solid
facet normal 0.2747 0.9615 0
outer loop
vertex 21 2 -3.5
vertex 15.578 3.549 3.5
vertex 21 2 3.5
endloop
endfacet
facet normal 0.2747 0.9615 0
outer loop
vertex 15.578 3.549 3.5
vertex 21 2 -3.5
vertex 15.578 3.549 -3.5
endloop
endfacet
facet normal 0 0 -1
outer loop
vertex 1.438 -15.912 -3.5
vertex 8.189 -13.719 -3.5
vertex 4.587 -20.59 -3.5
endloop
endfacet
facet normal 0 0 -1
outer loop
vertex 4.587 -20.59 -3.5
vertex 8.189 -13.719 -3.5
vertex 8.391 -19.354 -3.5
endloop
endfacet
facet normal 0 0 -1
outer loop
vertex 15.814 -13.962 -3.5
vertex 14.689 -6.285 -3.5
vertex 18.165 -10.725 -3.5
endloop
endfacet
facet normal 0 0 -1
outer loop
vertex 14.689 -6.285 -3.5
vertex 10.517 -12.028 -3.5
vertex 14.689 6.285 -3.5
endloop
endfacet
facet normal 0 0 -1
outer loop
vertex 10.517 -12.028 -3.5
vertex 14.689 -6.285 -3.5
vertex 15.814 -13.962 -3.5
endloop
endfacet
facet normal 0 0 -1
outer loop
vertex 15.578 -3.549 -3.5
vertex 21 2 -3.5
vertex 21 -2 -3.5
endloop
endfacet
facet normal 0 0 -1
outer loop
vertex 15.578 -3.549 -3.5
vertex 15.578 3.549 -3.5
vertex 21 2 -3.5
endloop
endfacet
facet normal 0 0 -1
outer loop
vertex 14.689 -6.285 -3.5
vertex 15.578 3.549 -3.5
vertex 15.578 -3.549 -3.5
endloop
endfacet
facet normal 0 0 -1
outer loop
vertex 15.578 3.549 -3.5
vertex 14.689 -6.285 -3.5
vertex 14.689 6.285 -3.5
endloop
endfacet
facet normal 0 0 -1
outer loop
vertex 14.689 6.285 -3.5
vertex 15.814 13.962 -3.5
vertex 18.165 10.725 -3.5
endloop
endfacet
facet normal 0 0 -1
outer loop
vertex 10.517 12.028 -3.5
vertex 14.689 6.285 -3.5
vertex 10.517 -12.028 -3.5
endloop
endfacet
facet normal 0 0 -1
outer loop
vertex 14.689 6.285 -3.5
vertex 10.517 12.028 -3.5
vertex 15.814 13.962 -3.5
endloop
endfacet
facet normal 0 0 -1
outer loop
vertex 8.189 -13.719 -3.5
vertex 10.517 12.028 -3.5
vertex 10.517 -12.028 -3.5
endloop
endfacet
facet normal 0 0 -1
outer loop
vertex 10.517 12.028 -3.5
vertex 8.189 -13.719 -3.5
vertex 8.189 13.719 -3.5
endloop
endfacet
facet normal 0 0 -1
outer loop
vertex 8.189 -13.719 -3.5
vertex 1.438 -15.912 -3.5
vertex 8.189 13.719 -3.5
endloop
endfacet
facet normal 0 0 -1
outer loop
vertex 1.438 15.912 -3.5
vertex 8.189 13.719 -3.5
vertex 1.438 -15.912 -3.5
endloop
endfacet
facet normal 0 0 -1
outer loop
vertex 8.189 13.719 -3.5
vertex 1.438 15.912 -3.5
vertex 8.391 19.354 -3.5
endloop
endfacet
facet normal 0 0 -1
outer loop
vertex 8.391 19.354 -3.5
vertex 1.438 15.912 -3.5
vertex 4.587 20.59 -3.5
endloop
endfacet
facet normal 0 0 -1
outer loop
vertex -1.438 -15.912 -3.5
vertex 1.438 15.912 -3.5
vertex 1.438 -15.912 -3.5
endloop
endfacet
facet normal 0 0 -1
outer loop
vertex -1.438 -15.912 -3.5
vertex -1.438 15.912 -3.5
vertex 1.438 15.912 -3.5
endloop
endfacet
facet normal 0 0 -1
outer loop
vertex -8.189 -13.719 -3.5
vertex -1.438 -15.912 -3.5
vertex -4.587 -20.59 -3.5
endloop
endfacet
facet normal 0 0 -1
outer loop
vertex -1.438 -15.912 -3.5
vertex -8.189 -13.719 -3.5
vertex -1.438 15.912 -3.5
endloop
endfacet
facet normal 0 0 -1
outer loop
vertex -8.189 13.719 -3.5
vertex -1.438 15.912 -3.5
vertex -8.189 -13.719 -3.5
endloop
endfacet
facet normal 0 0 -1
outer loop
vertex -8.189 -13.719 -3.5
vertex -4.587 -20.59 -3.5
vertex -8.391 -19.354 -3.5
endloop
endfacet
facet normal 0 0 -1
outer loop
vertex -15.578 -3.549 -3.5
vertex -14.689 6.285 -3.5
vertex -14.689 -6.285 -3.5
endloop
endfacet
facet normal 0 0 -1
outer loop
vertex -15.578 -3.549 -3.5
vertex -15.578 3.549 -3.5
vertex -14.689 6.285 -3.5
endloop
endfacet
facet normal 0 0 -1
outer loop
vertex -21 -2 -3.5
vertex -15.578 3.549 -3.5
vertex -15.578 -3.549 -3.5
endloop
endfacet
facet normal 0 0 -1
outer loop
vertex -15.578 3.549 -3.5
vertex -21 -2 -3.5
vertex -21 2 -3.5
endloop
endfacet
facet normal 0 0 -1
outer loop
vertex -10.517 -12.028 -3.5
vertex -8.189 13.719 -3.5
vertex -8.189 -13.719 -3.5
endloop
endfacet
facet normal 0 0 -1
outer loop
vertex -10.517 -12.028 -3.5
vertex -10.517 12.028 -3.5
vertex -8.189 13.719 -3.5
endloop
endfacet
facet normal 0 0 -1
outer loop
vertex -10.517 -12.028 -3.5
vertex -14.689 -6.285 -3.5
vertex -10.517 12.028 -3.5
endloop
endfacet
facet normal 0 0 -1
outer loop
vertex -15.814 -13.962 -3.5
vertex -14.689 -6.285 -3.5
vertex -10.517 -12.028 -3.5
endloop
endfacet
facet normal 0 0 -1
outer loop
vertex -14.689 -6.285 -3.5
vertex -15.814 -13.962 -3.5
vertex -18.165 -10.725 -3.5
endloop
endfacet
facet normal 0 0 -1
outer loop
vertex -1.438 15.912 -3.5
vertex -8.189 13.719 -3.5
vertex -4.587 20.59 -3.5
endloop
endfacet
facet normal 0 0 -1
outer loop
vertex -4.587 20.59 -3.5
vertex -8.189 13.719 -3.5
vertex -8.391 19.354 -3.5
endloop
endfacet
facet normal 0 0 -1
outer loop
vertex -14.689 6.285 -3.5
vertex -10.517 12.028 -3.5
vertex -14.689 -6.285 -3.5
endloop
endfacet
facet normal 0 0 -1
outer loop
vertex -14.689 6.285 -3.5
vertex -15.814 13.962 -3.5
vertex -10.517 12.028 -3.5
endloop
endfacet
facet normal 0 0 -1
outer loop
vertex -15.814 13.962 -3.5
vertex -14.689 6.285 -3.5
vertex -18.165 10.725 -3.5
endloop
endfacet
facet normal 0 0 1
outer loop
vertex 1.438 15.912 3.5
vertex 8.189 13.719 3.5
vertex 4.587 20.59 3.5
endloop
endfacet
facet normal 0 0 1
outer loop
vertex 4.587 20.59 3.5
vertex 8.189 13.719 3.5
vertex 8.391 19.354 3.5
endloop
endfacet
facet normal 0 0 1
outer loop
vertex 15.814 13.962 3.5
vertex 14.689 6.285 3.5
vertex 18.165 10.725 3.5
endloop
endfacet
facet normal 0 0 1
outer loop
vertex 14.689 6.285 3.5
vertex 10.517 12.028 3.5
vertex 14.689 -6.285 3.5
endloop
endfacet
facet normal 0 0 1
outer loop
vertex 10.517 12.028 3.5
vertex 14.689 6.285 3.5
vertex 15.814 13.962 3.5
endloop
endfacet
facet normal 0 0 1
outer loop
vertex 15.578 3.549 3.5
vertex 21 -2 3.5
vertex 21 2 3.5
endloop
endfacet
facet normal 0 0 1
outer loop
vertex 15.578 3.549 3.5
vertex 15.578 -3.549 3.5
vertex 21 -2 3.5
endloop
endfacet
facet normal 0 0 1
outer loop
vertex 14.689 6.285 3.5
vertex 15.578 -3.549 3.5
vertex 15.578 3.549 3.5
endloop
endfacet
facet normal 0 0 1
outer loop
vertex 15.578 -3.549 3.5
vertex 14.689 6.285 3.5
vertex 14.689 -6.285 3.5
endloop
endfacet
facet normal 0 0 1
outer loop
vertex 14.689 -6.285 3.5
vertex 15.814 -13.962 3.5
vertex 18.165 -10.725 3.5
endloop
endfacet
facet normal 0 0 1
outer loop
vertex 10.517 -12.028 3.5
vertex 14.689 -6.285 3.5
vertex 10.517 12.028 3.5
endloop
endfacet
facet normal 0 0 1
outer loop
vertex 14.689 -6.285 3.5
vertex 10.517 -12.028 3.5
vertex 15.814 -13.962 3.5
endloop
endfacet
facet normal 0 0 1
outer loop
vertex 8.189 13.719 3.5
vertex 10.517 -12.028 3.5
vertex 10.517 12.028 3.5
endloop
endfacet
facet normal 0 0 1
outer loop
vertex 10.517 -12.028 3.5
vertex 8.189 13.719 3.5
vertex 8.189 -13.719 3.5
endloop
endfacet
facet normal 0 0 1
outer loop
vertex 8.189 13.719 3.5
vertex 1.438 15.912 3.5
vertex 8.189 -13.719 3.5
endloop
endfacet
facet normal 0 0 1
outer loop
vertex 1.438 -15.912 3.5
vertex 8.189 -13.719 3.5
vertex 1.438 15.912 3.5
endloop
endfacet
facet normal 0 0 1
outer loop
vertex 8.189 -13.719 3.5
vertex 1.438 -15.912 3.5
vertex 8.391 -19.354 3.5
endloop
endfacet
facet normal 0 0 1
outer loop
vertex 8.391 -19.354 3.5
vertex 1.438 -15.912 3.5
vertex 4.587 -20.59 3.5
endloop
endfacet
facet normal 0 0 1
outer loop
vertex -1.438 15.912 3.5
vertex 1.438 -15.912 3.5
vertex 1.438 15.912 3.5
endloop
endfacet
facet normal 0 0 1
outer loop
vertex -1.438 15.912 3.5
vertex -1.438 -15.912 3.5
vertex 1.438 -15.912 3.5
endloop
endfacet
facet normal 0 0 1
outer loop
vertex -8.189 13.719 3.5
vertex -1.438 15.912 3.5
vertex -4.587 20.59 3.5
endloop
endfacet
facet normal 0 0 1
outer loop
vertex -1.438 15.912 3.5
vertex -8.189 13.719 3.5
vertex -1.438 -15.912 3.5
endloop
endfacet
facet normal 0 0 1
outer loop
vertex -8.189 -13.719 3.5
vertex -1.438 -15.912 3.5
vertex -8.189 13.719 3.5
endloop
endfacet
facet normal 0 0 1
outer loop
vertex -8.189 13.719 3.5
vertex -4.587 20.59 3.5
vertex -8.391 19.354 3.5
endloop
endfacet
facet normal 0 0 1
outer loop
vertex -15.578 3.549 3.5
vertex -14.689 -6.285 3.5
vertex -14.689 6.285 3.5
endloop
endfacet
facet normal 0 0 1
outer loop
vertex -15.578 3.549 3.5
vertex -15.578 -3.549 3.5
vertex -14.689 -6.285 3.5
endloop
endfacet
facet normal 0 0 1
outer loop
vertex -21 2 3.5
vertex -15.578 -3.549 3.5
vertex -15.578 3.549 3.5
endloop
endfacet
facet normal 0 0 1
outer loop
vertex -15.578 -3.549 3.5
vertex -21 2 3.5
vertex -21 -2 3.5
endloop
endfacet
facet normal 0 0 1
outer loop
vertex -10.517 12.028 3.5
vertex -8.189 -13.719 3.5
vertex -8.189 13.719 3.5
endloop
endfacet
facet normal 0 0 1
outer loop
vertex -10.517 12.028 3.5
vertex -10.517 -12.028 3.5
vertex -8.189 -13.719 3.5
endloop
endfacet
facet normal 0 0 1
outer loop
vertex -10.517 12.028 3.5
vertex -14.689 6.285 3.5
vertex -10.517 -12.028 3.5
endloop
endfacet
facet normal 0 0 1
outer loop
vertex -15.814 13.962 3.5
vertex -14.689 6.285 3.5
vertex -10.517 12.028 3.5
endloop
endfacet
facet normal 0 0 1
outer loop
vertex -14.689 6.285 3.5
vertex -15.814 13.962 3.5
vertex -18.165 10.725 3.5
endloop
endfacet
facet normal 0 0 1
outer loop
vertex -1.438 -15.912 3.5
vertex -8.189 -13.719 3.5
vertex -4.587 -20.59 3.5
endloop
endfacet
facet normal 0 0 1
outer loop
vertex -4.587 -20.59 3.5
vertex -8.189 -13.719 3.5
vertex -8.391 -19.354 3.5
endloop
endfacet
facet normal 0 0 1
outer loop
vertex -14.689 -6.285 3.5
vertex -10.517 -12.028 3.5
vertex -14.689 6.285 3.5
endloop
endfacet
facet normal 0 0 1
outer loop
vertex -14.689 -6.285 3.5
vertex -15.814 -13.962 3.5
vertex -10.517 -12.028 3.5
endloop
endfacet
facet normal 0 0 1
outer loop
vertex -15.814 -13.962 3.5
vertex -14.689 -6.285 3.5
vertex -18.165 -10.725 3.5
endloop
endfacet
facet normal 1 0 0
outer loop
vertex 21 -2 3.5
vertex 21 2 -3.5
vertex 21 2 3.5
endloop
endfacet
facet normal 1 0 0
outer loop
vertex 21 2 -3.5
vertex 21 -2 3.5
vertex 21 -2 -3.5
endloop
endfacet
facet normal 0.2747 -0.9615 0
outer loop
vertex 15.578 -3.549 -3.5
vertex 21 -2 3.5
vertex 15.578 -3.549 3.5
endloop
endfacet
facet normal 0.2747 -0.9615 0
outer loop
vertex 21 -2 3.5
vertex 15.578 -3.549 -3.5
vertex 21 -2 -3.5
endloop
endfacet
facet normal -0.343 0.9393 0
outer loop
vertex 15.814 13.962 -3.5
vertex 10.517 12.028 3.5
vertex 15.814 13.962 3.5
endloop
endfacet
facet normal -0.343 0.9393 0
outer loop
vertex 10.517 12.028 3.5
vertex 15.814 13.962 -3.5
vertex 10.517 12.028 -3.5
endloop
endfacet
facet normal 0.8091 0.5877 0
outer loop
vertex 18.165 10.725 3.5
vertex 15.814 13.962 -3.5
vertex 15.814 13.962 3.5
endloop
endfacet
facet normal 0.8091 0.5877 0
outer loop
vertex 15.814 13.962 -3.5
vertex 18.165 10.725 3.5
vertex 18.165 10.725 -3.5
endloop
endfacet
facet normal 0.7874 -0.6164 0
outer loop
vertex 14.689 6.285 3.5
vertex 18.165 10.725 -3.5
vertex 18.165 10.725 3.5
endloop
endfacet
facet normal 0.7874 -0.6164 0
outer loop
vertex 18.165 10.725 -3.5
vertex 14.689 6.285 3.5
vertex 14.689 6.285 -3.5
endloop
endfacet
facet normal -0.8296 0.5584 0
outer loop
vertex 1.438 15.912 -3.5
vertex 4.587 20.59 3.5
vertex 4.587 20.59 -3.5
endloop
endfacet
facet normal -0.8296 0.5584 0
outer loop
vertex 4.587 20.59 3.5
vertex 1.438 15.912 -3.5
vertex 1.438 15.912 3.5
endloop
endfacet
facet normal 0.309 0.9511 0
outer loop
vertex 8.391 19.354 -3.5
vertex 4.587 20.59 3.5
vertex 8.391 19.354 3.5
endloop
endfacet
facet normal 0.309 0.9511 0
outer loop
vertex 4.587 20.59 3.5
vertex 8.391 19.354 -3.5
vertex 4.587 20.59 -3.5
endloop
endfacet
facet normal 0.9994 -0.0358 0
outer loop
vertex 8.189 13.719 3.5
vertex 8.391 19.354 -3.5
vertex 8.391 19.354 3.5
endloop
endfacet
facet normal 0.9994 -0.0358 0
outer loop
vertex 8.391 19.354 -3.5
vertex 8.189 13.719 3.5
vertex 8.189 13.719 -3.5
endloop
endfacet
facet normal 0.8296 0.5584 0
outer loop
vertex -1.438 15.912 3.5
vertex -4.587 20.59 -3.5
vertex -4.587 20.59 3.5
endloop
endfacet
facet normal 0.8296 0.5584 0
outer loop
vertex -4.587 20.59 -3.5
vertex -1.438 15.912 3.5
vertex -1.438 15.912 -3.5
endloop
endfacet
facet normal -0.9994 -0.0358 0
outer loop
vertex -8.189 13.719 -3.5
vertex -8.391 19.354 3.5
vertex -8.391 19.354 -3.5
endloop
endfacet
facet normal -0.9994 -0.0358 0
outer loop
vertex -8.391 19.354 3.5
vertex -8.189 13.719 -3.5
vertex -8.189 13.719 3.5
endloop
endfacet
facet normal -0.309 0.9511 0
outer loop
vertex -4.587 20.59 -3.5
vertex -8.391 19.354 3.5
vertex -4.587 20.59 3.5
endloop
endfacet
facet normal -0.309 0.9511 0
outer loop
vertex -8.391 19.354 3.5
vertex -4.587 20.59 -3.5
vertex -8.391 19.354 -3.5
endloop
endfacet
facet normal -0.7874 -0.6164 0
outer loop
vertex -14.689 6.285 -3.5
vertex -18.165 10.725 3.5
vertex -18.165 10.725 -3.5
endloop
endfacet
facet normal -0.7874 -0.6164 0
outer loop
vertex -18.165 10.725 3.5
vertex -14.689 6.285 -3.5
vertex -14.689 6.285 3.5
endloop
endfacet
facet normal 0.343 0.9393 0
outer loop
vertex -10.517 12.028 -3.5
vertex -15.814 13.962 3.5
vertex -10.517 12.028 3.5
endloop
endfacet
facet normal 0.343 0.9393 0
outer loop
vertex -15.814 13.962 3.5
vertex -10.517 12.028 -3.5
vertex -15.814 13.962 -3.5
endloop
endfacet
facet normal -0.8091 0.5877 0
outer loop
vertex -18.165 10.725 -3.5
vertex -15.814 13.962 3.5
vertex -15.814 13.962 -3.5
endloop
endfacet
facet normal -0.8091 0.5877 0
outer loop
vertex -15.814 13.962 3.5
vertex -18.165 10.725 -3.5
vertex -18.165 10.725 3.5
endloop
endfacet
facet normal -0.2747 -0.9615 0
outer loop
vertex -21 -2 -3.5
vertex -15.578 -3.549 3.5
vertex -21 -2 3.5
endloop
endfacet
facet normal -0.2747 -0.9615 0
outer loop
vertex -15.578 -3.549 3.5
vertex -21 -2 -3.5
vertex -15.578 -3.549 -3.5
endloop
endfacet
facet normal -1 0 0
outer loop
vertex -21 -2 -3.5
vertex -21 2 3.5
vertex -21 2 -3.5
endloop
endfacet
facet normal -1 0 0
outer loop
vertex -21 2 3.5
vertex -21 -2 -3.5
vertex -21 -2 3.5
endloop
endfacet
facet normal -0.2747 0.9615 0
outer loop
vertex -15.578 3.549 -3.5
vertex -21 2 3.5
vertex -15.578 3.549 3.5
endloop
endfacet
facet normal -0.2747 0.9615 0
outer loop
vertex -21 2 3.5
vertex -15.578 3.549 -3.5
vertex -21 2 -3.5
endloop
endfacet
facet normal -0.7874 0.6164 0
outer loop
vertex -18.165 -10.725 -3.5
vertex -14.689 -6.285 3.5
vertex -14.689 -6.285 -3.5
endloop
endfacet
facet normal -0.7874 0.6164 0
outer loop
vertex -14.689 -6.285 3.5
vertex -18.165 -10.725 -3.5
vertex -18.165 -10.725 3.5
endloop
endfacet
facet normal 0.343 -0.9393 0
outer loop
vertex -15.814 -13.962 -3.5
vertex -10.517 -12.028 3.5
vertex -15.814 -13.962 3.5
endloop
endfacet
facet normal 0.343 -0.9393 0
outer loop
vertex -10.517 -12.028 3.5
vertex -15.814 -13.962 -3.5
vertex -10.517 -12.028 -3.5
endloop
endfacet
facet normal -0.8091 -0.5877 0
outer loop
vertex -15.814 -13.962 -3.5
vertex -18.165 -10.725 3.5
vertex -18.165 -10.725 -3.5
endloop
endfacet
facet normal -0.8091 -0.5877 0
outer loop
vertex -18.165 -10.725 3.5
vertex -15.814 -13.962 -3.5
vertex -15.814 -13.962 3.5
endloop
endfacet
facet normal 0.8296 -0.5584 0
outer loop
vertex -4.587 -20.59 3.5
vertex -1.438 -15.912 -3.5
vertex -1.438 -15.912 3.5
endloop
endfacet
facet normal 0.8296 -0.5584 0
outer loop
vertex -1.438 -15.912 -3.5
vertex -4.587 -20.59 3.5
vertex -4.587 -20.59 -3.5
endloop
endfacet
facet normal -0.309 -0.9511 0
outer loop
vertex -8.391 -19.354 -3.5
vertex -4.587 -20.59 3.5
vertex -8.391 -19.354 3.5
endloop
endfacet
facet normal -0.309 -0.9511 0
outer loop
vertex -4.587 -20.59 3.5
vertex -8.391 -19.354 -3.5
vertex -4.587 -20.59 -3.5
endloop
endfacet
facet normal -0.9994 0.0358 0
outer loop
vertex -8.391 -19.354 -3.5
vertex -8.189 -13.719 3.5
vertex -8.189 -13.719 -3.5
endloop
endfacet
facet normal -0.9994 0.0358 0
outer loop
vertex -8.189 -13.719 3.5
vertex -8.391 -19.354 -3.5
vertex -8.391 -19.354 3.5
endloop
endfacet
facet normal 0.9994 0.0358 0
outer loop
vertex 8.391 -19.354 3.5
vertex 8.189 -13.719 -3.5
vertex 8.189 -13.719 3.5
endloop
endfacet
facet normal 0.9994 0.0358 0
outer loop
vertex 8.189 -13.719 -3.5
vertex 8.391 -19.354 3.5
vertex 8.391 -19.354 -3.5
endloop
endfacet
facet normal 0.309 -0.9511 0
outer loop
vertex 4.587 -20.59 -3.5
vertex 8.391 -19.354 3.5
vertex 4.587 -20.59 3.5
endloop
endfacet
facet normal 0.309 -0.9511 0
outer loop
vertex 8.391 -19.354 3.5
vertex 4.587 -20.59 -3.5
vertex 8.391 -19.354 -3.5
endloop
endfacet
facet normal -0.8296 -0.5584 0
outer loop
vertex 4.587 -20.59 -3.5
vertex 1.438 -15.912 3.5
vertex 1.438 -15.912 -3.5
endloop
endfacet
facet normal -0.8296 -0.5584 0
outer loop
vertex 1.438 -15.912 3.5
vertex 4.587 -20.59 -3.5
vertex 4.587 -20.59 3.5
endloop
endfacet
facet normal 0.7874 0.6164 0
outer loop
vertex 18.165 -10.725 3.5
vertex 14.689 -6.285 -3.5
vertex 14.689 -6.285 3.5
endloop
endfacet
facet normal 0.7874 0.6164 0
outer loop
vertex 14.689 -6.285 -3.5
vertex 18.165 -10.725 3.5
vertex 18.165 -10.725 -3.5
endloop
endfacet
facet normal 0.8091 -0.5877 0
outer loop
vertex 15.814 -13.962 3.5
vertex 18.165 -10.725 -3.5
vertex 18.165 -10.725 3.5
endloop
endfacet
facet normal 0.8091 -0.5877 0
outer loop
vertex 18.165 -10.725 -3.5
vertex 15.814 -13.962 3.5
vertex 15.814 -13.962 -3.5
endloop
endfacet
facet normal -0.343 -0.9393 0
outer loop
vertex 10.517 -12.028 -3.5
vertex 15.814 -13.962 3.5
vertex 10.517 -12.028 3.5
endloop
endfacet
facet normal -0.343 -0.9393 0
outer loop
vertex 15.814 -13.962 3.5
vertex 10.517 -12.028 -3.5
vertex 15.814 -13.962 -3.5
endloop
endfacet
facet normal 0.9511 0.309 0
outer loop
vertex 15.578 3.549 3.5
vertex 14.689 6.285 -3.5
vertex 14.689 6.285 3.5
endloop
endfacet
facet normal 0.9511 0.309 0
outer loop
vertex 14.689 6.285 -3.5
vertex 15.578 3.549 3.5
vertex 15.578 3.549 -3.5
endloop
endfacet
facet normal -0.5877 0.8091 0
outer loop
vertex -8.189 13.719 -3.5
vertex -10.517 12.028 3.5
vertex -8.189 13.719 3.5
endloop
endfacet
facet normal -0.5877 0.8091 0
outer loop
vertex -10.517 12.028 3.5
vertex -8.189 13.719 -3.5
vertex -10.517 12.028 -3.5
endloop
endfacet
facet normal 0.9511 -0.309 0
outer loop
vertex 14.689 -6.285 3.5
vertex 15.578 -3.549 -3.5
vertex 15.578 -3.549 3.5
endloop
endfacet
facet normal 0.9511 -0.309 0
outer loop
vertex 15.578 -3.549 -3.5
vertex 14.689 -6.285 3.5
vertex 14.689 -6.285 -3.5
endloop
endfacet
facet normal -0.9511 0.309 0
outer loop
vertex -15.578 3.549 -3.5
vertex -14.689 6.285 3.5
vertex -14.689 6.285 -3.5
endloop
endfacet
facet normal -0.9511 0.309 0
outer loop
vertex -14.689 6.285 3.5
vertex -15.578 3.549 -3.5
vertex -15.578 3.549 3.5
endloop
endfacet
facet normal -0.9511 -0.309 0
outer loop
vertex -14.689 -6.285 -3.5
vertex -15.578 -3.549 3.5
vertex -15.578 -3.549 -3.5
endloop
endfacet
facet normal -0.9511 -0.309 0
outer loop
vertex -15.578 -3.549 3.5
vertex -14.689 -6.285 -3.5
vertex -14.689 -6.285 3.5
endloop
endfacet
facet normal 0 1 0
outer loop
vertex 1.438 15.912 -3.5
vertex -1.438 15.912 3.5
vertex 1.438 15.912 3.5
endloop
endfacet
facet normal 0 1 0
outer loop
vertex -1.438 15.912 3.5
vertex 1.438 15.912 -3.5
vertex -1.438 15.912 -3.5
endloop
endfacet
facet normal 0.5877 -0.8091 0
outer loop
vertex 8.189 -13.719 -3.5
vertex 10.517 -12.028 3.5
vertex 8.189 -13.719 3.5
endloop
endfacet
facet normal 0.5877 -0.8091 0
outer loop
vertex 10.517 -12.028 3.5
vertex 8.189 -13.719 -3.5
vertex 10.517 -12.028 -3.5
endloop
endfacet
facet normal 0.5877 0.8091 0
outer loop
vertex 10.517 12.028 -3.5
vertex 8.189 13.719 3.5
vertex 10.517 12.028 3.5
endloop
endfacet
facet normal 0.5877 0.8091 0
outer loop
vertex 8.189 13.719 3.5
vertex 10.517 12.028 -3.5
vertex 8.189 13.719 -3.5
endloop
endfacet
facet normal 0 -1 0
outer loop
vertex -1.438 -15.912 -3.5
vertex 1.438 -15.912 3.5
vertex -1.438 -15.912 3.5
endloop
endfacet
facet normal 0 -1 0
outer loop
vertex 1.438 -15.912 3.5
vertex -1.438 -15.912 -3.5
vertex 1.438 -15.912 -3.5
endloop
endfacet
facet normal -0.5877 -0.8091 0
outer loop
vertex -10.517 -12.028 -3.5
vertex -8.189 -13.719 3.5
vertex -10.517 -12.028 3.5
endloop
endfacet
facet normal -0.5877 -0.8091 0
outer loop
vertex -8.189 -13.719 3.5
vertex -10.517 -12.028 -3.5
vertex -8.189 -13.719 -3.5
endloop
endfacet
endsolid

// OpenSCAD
module Gear_01(){

    color("#a8b0b2")
    union(){
        cylinder(7,16,16,$fn=30,center= true);

        for (i=[0:45:359]) {
            r = 14; // pattern radius
            n = 10; // number of teeth
            step = 360/n;
            
            for (i=[0:step:359]) {
                angle = i;
                dx = r*cos(angle);
                dy = r*sin(angle);
                translate([dx,dy,0])
                rotate([0,0,angle])  
                { 
                // #linear_extrude(7, scale = 1, center = true)
                linear_extrude(7, scale = 1, center = true)
                polygon(points=[[0,-4],[7,-2],[7,2],[0,4]]);
                 
                }    
            }
        }
    }

}


Gear_01();

// Written by Nicolì Angelo (Gengio) 2024: 
// MIT License

//Permission is hereby granted, free of charge, to any person obtaining a copy of this software and associated documentation files (the "Software"), to deal in the Software without restriction, including without limitation the rights to use, copy, modify, merge, publish, distribute, sublicense, and/or sell copies of the Software, and to permit persons to whom the Software is furnished to do so, subject to the following conditions:

//The above copyright notice and this permission notice shall be included in all copies or substantial portions of the Software.

//THE SOFTWARE IS PROVIDED "AS IS", WITHOUT WARRANTY OF ANY KIND, EXPRESS OR IMPLIED, INCLUDING BUT NOT LIMITED TO THE WARRANTIES OF MERCHANTABILITY, FITNESS FOR A PARTICULAR PURPOSE AND NONINFRINGEMENT. IN NO EVENT SHALL THE AUTHORS OR COPYRIGHT HOLDERS BE LIABLE FOR ANY CLAIM, DAMAGES OR OTHER LIABILITY, WHETHER IN AN ACTION OF CONTRACT, TORT OR OTHERWISE, ARISING FROM, OUT OF OR IN CONNECTION WITH THE SOFTWARE OR THE USE OR OTHER DEALINGS IN THE SOFTWARE.
